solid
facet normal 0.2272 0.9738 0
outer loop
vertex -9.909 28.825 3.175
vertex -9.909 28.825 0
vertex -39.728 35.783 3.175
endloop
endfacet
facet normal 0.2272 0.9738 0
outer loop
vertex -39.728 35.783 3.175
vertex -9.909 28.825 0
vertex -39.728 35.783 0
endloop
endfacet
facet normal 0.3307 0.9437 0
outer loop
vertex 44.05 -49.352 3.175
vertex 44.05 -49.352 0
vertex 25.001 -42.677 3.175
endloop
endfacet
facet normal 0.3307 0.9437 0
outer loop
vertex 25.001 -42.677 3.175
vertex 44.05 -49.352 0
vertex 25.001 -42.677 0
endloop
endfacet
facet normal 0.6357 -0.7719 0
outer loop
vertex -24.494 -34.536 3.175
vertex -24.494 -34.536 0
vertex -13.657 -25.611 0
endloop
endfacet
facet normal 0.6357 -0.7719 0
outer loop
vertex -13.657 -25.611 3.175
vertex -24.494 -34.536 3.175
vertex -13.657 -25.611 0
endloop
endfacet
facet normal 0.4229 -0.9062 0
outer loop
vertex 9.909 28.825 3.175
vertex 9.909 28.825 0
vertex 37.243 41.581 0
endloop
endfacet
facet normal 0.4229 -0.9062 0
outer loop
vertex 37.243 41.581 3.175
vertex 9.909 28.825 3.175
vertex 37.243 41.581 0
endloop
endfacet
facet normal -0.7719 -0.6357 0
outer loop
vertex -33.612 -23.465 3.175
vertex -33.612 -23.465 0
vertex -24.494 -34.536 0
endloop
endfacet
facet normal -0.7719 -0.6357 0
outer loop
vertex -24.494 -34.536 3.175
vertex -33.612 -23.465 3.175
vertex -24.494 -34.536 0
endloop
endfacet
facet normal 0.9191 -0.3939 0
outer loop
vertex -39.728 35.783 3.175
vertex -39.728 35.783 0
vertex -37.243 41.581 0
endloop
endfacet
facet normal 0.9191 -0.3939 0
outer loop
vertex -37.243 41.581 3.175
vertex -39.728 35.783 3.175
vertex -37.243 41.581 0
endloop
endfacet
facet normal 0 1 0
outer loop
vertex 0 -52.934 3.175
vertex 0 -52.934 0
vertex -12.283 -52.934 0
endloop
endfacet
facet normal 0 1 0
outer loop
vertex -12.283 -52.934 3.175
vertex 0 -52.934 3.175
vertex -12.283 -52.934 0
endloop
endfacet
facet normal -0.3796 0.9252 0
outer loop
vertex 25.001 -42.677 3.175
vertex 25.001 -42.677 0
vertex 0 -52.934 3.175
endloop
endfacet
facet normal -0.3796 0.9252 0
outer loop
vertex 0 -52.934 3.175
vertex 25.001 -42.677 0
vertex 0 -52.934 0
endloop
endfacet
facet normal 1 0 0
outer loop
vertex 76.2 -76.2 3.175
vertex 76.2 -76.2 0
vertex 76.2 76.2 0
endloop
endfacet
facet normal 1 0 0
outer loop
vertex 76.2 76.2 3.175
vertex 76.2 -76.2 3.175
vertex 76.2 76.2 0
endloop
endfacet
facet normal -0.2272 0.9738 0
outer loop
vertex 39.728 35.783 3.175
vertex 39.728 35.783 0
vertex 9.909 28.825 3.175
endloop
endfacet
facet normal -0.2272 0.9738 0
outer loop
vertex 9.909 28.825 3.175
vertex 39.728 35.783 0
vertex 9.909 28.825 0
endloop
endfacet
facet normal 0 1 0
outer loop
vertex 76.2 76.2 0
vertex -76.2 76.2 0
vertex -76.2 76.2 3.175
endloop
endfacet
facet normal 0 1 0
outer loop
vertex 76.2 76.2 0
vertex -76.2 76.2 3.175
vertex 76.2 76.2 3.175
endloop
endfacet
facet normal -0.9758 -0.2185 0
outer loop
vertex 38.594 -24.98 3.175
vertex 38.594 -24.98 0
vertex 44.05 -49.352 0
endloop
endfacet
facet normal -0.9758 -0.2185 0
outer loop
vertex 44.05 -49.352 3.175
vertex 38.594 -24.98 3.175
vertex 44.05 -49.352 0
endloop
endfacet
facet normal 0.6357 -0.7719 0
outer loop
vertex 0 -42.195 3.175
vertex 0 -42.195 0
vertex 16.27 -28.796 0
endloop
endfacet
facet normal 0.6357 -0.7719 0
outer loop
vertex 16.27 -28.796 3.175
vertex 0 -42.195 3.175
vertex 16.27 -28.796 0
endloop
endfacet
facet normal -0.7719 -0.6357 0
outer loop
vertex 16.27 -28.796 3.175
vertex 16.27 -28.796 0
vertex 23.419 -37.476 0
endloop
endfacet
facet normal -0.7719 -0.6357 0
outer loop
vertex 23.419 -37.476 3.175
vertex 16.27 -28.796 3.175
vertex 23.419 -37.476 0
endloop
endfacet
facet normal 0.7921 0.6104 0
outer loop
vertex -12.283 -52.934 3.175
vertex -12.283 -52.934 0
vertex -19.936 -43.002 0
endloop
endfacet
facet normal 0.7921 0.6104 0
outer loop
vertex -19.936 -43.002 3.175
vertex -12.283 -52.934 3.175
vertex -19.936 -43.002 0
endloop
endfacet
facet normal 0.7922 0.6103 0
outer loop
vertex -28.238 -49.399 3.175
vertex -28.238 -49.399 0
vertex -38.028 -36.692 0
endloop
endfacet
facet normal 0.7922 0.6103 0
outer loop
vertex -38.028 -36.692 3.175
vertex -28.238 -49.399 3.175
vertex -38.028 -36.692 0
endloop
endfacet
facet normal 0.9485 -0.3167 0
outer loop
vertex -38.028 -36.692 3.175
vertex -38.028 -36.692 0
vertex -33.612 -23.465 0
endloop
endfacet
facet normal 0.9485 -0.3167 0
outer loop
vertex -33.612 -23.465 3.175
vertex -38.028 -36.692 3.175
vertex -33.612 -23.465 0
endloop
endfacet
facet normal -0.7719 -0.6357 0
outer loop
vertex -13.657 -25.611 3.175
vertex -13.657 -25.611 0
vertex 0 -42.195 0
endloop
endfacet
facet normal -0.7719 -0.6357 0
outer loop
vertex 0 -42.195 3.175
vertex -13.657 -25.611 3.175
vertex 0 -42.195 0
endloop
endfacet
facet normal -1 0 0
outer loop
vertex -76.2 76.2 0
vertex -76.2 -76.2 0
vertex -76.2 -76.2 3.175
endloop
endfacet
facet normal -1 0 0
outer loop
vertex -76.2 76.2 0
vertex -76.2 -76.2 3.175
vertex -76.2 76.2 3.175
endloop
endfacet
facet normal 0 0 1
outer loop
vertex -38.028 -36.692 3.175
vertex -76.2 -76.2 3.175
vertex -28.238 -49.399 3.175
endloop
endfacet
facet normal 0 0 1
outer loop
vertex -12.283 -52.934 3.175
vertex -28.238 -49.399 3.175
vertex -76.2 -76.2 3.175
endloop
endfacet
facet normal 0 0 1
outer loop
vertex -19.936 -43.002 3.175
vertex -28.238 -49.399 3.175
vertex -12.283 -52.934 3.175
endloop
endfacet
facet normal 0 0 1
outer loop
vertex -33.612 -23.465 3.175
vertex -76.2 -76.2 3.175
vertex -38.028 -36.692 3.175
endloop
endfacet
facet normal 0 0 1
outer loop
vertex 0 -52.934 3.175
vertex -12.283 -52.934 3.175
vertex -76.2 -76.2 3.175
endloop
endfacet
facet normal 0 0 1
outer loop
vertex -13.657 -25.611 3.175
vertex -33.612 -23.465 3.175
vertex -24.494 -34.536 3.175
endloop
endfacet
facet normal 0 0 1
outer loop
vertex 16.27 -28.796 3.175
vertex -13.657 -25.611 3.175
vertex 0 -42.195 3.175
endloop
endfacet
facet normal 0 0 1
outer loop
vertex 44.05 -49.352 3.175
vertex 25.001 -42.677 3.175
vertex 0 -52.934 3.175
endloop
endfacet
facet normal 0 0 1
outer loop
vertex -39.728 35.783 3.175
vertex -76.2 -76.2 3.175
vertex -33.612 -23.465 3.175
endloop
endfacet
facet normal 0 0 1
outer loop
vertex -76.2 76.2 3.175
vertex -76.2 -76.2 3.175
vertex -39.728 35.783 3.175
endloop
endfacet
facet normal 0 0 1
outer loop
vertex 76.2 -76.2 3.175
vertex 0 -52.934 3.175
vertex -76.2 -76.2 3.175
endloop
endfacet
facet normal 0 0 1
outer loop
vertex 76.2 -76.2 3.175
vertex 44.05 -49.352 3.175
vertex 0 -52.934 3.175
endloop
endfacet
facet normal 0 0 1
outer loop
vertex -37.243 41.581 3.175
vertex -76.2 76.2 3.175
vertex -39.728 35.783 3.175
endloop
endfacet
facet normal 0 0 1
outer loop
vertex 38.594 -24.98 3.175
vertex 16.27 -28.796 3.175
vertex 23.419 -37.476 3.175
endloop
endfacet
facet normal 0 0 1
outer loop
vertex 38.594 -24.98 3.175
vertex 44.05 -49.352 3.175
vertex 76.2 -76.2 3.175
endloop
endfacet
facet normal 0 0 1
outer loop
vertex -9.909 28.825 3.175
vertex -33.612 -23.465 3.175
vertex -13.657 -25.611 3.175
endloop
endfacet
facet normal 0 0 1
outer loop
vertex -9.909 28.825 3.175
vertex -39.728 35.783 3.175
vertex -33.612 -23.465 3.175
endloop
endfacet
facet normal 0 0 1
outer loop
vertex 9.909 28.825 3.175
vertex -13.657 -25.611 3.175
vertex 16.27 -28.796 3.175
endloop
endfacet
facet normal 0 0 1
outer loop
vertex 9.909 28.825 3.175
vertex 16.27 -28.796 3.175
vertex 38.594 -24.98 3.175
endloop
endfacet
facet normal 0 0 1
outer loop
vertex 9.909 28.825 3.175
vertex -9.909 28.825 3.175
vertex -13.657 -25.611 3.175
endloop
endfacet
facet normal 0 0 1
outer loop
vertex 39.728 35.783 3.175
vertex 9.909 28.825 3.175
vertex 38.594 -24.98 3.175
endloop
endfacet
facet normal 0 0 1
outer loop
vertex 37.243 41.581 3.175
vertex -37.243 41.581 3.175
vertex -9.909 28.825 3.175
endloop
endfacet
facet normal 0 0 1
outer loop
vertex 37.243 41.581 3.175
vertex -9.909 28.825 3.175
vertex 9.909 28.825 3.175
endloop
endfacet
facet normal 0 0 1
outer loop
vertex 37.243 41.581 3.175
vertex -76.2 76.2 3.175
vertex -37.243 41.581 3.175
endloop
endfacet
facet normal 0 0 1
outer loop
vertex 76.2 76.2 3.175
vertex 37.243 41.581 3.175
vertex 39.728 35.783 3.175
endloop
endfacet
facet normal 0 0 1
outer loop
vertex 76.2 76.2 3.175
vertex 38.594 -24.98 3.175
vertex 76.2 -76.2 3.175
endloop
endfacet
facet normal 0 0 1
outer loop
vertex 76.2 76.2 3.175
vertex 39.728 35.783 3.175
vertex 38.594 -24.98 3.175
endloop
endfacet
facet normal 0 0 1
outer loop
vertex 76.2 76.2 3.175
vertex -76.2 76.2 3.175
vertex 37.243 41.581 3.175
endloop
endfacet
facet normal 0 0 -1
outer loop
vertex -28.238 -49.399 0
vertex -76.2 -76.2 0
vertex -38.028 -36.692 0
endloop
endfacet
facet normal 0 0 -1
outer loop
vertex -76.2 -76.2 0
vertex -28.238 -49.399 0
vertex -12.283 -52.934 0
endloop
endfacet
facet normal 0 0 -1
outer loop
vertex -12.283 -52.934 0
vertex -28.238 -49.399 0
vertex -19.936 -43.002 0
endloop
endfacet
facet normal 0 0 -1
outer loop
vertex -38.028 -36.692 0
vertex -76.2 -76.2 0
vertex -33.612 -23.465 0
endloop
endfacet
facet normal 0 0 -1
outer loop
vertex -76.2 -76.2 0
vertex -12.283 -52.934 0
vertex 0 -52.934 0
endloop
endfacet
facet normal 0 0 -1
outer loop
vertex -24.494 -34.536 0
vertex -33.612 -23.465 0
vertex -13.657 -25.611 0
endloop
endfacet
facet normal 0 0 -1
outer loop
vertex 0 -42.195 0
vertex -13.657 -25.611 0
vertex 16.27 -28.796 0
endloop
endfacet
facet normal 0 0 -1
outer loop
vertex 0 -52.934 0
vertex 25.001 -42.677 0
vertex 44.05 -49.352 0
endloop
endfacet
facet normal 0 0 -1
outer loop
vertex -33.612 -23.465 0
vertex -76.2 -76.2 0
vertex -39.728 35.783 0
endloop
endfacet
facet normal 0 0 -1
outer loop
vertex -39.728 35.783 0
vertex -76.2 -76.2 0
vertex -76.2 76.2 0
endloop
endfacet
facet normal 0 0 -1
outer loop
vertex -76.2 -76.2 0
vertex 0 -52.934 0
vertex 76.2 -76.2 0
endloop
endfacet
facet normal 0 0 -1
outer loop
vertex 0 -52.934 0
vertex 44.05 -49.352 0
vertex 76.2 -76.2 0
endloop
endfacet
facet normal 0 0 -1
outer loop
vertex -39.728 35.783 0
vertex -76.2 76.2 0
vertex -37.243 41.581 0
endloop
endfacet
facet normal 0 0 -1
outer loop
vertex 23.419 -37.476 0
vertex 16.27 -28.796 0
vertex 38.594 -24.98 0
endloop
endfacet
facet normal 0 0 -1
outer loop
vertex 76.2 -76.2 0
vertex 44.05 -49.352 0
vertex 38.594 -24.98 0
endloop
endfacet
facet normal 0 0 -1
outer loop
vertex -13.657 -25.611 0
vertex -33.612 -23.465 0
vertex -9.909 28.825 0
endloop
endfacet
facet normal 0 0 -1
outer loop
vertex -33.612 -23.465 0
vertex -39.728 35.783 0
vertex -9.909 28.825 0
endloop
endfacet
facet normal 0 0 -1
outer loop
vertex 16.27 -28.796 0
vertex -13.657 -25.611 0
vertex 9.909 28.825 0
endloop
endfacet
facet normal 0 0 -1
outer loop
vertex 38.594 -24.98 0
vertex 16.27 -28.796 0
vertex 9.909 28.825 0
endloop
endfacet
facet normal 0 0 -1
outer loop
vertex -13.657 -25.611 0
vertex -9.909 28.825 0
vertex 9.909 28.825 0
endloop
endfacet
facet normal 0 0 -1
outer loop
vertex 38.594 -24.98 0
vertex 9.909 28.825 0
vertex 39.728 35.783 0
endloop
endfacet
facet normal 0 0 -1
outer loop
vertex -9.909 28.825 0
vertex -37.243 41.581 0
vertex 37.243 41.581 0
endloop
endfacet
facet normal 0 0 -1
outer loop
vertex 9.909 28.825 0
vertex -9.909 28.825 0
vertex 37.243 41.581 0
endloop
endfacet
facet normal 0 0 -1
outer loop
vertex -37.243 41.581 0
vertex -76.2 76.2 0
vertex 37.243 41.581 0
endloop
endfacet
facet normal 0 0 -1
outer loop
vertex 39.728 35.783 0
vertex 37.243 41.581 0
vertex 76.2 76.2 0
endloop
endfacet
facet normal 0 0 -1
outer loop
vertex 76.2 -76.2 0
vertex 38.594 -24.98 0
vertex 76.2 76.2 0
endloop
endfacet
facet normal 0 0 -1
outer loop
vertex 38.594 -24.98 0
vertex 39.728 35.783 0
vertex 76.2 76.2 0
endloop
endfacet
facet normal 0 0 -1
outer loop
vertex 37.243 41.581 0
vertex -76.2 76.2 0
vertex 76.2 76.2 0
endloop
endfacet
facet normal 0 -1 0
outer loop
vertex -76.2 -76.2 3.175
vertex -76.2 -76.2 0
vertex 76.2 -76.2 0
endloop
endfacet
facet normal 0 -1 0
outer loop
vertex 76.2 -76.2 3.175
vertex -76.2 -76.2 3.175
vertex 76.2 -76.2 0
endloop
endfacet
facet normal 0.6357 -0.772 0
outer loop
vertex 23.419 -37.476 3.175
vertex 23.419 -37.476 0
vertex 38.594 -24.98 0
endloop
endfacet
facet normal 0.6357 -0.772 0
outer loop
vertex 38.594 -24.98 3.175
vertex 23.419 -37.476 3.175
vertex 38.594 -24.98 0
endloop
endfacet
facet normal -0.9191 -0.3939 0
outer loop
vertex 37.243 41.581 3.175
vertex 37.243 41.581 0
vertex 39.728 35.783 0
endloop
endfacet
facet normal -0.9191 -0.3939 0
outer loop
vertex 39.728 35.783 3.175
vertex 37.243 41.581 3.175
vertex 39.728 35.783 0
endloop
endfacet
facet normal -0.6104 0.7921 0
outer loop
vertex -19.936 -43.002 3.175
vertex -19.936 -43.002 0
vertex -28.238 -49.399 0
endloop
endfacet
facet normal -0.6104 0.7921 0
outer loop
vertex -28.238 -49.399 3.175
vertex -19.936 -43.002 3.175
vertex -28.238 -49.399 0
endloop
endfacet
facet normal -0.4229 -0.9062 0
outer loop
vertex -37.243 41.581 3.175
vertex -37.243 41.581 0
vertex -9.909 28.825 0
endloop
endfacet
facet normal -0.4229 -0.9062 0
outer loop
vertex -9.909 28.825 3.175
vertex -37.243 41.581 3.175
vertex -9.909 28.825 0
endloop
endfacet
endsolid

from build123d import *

# Parameters (mm, degrees)
F0_W     = 152.4
F0_H     = 152.4
F1_DEPTH = 3.175


with BuildPart() as f1:
    # F0 (on Top) → F1 (new body)
    with BuildSketch(Plane.XY):
        Rectangle(F0_W, F0_H)
        Polygon((-38.028175, -36.692278), (-33.612002, -23.464767), (-24.494429, -34.536101), (-13.657085, -25.611226), (0, -42.194824), (16.270282, -28.795762), (23.419121, -37.476491), (38.59369, -24.979782), (44.050138, -49.352157), (25.000943, -42.676793), (0, -52.934063), (-12.283398, -52.934063), (-19.935643, -43.002425), (-28.237687, -49.399082), align=None, mode=Mode.SUBTRACT)
        Polygon((-39.728351, 35.782534), (-37.243412, 41.580727), (-9.90904, 28.824696), align=None, mode=Mode.SUBTRACT)
        Polygon((39.728351, 35.782534), (9.90904, 28.824696), (37.243412, 41.580727), align=None, mode=Mode.SUBTRACT)
    extrude(amount=F1_DEPTH)


solid = f1.part
